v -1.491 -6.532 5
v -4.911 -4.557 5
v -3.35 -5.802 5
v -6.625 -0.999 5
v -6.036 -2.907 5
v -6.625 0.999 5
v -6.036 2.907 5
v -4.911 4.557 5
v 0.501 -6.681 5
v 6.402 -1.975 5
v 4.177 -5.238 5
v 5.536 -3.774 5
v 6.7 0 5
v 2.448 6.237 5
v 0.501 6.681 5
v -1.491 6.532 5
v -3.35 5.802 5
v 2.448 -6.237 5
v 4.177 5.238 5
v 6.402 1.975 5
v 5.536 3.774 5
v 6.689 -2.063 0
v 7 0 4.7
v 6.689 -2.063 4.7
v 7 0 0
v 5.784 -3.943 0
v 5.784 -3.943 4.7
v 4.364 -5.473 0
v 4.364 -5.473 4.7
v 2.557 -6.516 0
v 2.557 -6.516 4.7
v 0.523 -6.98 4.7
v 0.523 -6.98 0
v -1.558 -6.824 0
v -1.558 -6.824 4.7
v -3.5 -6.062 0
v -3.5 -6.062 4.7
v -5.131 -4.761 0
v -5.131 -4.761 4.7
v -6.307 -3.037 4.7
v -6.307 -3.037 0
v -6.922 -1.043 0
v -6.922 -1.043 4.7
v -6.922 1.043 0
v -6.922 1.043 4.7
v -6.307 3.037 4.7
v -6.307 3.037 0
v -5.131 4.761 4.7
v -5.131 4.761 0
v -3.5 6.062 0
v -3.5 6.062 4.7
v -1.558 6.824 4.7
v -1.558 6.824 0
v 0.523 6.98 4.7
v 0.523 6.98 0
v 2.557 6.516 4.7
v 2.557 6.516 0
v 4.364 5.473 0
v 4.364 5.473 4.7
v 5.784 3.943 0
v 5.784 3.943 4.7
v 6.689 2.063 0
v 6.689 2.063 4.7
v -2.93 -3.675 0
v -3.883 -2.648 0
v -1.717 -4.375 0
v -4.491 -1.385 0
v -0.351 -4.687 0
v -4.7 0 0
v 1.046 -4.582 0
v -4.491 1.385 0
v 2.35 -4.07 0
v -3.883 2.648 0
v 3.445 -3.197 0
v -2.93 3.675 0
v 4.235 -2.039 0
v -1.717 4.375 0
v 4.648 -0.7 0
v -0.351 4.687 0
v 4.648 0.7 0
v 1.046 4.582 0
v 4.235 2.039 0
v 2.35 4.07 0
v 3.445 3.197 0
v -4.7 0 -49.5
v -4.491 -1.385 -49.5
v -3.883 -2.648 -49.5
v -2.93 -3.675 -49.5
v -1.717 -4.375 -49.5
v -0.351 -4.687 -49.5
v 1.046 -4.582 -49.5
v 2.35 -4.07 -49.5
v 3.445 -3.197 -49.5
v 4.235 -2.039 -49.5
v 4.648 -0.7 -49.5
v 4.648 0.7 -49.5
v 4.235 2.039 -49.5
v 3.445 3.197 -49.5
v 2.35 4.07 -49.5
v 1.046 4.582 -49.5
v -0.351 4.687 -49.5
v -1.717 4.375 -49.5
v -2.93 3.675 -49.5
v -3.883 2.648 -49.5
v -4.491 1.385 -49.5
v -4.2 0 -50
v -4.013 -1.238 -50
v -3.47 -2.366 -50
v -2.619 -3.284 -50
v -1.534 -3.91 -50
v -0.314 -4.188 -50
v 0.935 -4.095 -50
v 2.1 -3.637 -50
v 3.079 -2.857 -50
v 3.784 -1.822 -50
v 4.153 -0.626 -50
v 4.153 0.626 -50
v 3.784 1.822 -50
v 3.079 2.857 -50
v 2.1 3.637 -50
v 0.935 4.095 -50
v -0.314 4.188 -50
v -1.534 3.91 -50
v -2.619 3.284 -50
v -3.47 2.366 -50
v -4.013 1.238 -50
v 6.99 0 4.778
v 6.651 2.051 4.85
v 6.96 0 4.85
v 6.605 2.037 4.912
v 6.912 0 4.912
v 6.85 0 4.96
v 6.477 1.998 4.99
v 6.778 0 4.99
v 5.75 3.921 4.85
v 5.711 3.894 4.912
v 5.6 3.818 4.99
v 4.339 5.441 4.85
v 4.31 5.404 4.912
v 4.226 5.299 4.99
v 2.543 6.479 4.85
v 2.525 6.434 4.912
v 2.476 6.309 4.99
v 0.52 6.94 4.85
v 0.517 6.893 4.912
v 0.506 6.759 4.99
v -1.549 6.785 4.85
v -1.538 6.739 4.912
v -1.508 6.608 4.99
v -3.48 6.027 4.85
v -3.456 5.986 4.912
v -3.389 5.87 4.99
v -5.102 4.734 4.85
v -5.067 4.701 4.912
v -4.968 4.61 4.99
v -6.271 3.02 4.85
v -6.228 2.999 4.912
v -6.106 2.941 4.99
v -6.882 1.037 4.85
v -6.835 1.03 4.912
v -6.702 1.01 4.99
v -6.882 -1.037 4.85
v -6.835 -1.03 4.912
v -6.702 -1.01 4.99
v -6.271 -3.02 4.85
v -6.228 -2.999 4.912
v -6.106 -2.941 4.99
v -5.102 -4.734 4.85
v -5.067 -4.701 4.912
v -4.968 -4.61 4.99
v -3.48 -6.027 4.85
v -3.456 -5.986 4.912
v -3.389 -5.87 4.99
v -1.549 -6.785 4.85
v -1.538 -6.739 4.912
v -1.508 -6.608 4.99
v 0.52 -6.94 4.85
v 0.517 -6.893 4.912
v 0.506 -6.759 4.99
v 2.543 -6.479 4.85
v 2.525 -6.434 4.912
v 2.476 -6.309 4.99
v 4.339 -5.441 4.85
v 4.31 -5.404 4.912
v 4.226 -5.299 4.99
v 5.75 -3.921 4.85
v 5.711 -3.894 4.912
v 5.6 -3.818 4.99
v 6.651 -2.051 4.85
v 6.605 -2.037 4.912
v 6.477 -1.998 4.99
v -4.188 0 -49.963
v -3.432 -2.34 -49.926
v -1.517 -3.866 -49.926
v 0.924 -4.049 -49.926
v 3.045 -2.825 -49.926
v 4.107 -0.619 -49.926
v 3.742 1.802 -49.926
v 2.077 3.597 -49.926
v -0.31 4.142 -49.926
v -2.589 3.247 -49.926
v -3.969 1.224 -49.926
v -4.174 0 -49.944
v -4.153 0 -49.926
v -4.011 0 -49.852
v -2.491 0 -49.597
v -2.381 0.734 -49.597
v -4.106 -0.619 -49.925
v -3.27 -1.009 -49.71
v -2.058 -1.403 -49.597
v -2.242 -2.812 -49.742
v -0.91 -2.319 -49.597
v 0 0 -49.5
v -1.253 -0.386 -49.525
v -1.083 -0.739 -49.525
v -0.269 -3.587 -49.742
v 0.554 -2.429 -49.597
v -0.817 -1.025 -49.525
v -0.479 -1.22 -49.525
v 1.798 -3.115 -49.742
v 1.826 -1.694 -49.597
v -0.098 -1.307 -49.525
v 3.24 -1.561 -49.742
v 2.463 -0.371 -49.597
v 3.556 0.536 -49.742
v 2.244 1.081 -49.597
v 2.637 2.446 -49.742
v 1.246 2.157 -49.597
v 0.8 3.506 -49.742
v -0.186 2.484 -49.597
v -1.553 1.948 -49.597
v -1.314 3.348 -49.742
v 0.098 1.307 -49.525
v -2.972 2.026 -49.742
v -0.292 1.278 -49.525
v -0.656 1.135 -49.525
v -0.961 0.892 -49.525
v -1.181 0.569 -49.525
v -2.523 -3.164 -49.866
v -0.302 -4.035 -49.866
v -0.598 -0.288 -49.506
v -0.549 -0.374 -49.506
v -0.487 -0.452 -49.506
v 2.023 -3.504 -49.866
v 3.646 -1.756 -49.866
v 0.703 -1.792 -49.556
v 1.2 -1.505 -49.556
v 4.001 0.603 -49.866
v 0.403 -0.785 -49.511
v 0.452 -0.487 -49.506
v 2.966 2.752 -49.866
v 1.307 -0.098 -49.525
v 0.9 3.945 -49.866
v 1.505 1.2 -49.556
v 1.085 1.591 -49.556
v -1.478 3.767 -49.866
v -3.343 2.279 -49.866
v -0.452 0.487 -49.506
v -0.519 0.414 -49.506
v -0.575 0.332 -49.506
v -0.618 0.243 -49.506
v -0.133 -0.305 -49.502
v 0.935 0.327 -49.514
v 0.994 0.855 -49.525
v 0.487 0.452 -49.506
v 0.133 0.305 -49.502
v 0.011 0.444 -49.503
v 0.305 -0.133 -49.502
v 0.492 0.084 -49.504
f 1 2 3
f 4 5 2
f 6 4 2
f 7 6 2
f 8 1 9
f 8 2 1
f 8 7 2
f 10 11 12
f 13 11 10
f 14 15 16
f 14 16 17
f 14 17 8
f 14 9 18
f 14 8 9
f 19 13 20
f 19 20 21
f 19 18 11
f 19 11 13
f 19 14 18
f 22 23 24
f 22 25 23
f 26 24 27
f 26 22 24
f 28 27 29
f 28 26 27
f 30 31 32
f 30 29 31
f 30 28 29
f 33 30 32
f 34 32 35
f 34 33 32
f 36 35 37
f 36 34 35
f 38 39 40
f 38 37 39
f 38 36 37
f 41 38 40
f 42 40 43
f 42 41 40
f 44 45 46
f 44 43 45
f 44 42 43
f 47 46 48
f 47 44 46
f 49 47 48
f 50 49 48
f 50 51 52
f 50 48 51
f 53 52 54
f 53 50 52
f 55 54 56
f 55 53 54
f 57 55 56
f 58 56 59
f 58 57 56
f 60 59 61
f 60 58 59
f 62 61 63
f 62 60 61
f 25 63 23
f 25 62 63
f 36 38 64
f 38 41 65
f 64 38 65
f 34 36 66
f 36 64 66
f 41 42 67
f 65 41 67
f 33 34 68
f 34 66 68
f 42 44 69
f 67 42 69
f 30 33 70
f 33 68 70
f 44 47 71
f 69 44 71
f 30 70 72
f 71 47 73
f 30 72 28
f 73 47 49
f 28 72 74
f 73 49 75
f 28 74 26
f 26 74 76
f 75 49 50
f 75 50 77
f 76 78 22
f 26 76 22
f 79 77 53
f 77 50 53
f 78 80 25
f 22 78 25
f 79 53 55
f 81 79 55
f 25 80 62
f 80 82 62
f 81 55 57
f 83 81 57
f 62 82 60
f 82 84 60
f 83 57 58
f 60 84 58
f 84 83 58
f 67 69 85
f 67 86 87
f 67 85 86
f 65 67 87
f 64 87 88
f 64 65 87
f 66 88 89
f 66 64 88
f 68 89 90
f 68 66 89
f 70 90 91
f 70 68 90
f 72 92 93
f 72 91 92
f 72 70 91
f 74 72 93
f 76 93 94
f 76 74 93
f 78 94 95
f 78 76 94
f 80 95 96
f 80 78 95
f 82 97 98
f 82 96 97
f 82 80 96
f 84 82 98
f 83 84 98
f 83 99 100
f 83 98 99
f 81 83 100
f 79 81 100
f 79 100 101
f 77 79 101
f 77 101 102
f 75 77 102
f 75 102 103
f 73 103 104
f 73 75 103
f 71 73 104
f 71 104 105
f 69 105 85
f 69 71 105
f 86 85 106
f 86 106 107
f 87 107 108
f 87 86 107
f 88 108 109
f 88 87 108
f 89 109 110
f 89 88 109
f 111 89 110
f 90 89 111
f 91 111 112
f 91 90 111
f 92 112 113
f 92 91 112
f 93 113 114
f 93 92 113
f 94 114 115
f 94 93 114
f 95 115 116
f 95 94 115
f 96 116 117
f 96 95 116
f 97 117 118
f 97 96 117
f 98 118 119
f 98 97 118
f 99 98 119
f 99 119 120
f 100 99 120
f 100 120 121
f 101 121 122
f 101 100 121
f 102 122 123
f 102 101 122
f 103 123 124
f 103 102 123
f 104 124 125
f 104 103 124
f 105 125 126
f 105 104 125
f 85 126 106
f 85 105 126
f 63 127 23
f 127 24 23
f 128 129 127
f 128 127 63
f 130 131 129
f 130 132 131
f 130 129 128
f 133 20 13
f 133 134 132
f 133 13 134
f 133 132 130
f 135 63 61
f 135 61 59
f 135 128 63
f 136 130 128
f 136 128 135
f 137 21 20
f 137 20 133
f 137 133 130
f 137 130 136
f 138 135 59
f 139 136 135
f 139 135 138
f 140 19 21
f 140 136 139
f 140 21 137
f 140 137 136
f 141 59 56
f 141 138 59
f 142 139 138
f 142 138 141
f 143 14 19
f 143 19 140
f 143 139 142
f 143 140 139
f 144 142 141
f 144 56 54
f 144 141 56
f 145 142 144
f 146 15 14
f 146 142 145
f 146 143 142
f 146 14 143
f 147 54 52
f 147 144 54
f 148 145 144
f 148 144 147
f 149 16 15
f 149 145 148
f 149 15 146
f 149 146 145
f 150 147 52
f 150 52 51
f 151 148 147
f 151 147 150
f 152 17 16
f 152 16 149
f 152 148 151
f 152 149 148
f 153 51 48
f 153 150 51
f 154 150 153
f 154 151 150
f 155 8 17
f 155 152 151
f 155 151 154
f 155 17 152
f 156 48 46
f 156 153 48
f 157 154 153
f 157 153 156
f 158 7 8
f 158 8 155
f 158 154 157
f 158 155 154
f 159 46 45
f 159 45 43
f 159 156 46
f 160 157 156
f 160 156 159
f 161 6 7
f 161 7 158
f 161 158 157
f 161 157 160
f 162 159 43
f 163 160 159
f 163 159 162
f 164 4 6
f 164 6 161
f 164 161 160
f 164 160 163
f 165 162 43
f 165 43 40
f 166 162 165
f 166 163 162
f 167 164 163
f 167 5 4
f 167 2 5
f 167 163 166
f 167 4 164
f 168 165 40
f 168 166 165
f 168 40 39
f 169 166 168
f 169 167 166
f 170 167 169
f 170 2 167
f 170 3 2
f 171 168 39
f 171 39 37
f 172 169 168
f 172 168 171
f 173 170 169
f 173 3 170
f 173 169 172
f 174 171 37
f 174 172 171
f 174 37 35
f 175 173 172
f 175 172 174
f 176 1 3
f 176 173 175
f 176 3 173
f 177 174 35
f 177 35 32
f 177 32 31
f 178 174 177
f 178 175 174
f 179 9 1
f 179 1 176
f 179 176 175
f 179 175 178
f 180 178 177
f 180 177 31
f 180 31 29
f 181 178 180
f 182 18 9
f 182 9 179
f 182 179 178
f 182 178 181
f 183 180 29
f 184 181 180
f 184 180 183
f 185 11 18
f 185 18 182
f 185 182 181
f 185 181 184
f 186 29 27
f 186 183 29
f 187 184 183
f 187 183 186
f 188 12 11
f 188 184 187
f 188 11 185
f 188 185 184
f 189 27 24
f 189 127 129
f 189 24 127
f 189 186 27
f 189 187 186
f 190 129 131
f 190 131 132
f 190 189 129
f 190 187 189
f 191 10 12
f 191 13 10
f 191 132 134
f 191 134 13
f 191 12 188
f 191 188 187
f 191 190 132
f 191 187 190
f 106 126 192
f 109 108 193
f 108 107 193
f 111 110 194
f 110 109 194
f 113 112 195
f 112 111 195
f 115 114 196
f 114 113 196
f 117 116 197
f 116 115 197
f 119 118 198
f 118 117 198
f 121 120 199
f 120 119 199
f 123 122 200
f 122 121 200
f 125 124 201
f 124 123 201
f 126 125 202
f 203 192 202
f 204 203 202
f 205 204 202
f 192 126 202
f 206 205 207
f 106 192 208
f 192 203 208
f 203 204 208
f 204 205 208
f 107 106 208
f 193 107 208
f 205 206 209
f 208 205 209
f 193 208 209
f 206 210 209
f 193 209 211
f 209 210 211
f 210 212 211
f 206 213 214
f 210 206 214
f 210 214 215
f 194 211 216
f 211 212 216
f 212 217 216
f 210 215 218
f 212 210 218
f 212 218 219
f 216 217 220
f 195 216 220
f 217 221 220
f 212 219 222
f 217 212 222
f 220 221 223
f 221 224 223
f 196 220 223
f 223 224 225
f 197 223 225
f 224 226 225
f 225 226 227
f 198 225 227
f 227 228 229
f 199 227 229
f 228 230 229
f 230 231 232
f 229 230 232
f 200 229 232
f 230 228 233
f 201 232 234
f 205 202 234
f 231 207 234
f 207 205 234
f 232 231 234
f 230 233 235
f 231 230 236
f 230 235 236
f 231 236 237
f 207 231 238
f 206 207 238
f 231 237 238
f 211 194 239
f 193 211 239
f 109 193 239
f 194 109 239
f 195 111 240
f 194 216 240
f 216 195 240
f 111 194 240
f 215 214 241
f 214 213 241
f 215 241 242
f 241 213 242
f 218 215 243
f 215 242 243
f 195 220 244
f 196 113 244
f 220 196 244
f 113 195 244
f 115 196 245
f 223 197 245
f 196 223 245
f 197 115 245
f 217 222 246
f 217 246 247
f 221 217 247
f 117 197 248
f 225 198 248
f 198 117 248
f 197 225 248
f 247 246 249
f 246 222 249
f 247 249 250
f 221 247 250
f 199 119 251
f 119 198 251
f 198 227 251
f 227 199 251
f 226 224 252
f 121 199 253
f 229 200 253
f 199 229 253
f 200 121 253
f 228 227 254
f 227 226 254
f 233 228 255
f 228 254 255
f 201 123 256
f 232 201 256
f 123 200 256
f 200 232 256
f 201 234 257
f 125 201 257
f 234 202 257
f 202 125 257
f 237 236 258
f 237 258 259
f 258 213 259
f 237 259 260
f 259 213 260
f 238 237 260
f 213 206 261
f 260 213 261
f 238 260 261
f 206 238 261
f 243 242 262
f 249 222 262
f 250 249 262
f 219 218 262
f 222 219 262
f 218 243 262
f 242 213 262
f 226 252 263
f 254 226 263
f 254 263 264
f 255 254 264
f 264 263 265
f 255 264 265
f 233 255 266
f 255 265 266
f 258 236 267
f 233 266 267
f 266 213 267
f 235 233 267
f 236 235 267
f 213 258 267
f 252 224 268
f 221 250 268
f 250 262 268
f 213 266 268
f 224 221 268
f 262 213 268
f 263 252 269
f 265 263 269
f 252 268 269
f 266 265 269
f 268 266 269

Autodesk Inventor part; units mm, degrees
ref_plane "YZ Plane" through (0, 0, 0) normal (1, 0, 0) x (0, 1, 0)
ref_plane "XZ Plane" through (0, 0, 0) normal (0, 1, 0) x (-1, 0, 0)
ref_plane "XY Plane" through (0, 0, 0) normal (0, 0, 1) x (1, 0, 0)
sketch "Sketch1" plane through (0, 0, 0) normal (0, 0, 1) x (1, 0, 0)
  circle A0 centre (0, 0) radius 7
  dimension "d0" = 14
extrude "Extrusion1" add sketch "Sketch1" along normal blind 5
sketch "Sketch2" plane through (0, 0, 0) normal (0, 0, -1) x (-1, 0, 0)
  circle A0 centre (0, 0) radius 4.7
  dimension "d3" = 9.4
extrude "Extrusion2" add sketch "Sketch2" along normal blind 50
fillet "Fillet1" radius 0.3 1 edges at (-7, 0, 5)
thread "Thread1" size "M10x1.5" class "6g" standard "ANSI Metric M Profile" length 15
chamfer "Chamfer1" distance 0.5 angle 45 1 edges at (4.7, 0, -50)
sketch "Sketch3" plane through (0, 0, 0) normal (0, 1, 0) x (-1, 0, 0)
  ellipse E0 centre (0, -50) end of major axis (4.2, -50) minor radius 0.5 (4.2, -50) -> (0, -49.5) ccw
  line L0 (4.2, -50) -> (0, -50)
  line L1 (0, -50) -> (0, -49.5)
  point P0 (0, 0)
revolve "Revolution1" cut sketch "Sketch3" angle 360 about axis through (0, 0, -50) along (0, 0, 1)
properties part number "Kingpin_Bolt" material "Steel, Carbon"
